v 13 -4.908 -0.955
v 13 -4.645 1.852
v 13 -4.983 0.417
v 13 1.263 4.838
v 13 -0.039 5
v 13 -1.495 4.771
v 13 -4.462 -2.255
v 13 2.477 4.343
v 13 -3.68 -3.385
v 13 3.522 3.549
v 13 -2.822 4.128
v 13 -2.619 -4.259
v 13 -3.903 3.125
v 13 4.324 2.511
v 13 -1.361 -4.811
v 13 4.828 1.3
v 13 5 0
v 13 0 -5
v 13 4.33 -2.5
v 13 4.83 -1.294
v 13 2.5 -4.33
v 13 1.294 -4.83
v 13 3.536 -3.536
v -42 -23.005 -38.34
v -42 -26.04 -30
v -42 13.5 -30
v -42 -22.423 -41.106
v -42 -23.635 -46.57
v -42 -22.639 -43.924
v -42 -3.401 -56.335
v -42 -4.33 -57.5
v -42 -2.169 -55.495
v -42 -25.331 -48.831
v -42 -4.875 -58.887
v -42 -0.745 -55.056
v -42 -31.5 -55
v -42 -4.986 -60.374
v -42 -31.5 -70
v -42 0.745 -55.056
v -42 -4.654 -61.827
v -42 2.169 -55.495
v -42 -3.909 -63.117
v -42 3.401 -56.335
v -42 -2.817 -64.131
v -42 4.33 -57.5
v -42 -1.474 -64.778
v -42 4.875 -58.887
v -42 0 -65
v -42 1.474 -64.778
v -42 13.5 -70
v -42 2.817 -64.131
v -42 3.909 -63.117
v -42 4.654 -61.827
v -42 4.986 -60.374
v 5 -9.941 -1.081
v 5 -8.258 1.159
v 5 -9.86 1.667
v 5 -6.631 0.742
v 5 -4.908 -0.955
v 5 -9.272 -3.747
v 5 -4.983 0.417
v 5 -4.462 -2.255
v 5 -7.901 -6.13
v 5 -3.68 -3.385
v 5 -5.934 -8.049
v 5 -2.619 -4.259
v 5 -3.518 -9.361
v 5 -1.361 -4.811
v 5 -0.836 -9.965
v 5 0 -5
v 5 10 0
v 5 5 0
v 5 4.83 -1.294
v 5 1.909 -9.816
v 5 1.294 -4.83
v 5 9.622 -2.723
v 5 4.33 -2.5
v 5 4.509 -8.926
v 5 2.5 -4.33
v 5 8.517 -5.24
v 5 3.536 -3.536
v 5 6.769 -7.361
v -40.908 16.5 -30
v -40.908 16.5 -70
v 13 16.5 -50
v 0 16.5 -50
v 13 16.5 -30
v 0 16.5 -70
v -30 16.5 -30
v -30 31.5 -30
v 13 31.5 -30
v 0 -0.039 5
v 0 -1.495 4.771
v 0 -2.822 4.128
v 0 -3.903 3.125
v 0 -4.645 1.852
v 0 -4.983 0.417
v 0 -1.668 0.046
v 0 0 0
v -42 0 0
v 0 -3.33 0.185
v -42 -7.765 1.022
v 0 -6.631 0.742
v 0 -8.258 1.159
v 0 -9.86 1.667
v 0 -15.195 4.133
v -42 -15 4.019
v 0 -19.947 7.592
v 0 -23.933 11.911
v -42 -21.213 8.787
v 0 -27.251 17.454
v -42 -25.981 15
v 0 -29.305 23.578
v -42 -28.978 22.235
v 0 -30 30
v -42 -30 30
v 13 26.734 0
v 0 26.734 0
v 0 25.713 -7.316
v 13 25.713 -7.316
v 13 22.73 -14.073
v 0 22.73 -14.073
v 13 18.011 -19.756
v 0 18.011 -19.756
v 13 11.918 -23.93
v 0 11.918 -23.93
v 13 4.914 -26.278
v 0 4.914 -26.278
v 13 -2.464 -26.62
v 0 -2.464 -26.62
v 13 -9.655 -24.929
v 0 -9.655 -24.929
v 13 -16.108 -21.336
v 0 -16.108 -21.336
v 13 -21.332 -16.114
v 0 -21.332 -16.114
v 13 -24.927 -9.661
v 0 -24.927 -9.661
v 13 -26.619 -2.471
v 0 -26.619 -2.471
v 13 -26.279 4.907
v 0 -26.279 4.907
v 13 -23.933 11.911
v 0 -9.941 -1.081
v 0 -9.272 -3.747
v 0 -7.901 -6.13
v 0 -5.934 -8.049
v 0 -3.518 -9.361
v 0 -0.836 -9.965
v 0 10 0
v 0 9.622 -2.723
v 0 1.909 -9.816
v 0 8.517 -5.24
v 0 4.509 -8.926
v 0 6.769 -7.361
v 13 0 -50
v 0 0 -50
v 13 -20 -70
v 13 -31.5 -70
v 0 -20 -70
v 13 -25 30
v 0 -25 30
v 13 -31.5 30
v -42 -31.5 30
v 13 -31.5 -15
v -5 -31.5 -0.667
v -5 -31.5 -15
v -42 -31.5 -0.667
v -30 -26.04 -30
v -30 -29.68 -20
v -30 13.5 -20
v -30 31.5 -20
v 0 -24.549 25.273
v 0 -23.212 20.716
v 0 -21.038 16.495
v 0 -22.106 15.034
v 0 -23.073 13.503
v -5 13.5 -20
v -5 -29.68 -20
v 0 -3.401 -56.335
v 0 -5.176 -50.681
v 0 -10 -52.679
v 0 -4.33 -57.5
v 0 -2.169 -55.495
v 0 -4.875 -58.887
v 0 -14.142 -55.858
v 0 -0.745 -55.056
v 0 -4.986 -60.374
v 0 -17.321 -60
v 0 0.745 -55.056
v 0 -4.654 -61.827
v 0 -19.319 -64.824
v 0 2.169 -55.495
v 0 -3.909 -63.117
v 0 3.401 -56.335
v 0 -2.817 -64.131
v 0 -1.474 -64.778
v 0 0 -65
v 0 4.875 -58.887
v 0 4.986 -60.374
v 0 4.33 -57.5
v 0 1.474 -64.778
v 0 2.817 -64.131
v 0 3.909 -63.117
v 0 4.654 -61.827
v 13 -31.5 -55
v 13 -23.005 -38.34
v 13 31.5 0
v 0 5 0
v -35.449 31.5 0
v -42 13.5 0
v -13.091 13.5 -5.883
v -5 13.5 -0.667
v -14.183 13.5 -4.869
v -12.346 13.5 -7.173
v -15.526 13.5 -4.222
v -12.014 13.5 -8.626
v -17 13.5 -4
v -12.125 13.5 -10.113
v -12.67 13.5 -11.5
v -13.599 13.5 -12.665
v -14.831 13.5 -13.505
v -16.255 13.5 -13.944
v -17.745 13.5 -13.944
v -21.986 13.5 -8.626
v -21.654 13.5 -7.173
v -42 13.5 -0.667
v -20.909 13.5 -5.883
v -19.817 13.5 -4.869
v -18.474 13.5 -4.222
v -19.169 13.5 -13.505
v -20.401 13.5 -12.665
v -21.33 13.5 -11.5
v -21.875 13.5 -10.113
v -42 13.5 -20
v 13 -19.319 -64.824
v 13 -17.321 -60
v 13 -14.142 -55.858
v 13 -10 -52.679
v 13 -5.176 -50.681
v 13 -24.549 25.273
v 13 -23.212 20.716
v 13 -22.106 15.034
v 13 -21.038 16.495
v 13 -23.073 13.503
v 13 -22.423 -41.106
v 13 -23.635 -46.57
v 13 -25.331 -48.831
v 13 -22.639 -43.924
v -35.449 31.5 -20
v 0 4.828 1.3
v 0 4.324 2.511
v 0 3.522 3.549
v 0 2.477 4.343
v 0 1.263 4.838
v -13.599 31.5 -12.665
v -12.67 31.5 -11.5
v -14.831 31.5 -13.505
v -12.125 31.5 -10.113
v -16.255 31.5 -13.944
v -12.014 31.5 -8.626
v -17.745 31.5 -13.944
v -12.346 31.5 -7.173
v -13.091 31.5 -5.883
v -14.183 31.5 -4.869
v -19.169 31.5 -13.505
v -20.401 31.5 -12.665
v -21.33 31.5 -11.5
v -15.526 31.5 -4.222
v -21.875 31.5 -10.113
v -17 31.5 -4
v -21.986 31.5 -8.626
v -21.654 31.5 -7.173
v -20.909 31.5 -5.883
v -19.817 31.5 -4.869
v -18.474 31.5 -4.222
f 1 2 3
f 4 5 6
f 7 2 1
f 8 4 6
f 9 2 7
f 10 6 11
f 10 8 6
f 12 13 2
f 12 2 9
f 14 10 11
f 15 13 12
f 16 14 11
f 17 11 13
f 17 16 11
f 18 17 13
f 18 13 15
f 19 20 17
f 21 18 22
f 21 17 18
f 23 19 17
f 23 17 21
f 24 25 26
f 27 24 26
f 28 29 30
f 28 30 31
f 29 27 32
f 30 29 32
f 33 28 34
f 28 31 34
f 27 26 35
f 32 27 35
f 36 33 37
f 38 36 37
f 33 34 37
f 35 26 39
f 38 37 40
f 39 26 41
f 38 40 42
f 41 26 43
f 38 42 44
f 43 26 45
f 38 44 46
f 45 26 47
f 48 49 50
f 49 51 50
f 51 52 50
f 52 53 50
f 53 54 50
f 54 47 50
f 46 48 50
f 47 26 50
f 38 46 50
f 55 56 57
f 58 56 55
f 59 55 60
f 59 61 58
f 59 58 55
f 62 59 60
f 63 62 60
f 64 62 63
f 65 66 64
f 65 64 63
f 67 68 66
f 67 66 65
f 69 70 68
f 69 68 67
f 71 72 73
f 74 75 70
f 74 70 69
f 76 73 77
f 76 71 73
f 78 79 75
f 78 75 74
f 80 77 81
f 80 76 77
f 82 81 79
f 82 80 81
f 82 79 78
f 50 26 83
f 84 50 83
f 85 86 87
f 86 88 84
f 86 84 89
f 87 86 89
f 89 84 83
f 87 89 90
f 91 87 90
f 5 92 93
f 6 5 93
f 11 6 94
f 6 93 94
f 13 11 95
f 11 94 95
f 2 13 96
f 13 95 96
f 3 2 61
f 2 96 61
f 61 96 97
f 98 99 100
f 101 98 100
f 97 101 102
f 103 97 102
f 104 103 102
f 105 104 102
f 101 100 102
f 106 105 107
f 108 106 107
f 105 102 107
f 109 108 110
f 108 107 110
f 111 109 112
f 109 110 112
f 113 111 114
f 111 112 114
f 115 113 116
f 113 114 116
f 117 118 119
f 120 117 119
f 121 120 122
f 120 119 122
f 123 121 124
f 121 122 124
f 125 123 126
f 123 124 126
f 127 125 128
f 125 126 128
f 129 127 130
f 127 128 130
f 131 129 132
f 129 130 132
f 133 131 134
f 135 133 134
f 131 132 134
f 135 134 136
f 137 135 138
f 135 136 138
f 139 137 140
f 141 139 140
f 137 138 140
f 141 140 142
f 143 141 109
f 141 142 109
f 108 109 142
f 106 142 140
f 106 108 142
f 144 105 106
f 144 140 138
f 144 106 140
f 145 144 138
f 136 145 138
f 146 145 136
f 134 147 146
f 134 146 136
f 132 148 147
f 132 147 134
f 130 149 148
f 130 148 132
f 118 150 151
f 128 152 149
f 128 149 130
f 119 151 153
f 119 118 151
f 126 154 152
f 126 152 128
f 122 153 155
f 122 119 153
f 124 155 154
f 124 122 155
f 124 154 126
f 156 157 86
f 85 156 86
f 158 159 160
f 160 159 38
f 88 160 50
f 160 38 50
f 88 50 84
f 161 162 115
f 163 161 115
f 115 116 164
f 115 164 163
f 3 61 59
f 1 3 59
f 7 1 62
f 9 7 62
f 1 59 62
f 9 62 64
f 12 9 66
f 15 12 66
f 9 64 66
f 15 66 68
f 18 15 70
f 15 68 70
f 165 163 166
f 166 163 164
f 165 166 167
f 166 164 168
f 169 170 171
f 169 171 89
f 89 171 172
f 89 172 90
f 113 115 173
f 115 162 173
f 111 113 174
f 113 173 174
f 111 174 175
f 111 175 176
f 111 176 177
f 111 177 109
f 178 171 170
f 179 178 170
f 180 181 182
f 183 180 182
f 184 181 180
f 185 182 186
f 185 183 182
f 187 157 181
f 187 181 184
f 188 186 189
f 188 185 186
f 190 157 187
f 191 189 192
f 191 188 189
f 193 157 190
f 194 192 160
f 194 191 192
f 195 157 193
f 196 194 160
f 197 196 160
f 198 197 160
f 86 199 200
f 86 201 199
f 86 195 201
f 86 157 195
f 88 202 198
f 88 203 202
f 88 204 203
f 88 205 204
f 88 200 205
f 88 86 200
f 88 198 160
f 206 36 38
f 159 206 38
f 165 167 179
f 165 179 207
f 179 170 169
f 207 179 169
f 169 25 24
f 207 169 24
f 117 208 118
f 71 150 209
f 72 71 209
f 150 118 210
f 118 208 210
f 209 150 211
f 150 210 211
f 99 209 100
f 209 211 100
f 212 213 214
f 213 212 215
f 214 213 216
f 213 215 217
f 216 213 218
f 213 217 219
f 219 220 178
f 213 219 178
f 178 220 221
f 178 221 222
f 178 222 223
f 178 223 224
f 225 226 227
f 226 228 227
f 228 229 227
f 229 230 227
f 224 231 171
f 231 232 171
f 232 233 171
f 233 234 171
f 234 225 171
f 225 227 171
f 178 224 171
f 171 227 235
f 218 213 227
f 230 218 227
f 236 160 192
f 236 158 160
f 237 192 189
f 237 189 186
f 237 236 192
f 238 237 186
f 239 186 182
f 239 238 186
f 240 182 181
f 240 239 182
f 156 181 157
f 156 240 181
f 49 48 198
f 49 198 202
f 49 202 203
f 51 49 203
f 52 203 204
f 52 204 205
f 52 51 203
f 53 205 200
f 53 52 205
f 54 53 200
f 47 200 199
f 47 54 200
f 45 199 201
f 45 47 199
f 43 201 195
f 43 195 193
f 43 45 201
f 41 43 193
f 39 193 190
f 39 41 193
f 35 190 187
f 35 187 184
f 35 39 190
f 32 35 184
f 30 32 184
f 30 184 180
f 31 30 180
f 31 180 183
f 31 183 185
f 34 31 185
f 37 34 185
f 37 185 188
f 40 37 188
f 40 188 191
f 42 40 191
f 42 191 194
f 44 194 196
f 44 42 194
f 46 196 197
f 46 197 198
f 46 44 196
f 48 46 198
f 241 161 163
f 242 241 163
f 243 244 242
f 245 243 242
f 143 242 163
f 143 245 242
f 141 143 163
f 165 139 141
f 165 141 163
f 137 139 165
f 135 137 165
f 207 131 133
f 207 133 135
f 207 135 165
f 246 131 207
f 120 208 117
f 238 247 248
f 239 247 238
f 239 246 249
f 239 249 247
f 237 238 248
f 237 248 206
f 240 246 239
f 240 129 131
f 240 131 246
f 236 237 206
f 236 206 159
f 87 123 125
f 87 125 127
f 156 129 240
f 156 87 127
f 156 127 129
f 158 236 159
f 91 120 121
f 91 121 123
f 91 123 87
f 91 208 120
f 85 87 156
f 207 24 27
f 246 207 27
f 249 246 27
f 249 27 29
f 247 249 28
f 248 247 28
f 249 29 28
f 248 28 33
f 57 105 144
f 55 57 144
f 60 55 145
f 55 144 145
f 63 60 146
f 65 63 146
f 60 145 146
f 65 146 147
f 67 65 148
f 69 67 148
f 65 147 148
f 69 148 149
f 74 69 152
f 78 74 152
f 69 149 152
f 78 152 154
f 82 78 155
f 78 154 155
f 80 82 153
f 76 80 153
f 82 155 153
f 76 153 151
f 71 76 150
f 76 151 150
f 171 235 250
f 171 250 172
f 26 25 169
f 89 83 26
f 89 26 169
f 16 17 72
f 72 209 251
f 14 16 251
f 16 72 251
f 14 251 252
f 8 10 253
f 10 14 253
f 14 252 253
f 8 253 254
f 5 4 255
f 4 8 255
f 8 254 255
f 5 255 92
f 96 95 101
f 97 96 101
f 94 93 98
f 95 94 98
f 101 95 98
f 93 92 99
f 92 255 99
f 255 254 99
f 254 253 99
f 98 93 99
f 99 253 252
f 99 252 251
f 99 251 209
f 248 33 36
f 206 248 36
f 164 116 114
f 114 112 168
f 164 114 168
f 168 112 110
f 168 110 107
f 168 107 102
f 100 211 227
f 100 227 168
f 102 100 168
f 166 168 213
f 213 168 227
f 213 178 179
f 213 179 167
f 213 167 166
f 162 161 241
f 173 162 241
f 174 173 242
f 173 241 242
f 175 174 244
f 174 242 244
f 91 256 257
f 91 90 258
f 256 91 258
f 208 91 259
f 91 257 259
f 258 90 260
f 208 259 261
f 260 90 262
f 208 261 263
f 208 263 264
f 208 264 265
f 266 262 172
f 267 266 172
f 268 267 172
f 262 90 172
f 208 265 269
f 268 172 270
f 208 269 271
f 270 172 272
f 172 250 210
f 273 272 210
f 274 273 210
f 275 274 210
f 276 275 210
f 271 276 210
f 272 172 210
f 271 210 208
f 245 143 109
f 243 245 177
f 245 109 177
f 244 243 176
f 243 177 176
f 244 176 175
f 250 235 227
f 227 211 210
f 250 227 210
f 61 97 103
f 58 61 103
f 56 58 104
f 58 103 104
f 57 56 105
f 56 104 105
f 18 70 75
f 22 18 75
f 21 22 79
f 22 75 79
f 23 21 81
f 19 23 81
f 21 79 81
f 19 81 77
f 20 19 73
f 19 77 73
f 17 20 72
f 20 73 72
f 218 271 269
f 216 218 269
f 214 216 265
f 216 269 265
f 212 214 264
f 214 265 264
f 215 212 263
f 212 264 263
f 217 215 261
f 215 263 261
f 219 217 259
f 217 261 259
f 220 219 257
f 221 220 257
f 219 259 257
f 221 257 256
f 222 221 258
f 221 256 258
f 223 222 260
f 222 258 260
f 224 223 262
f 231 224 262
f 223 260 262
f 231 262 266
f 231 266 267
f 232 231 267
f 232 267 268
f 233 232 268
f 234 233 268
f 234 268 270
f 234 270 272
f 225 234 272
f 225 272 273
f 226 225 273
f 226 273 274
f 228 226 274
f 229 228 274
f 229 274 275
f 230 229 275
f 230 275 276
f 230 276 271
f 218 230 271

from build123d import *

# Parameters (mm, degrees)
BOSS_EXTRUDE4_DEPTH = 13
BOSS_EXTRUDE5_DEPTH = 5
FILLET2_R           = 20
BOSS_EXTRUDE6_START = -42
SKETCH2_7_R         = 5
BOSS_EXTRUDE6_DEPTH = 42
SKETCH5_R           = 25
CUT_EXTRUDE1_DEPTH  = 42
SKETCH7_W           = 12
SKETCH7_H           = 10
CUT_EXTRUDE2_DEPTH  = 239
SKETCH8_R           = 5
CUT_EXTRUDE3_DEPTH  = 130
CUT_EXTRUDE4_DEPTH  = 130
CUT_EXTRUDE6_DEPTH  = 37


with BuildPart() as part:
    # Sketch2 → Boss-Extrude4 (new body)
    with BuildSketch(Plane(origin=(0, 0, 0), x_dir=(0, 0, -1), z_dir=(1, 0, 0))):
        with BuildLine():
            Line((0, 31.5), (0, 26.733616794))
            ThreePointArc((0, 26.733616794), (26.024128556, -6.118087921), (-11.911437782, -23.933322312))
            ThreePointArc((-11.911437782, -23.933322312), (-20.46059932, -28.4429224), (-30, -30))
            Line((-30, -30), (-30, -31.5))
            Line((-30, -31.5), (15, -31.5))
            Line((15, -31.5), (38.339650933, -23.005061782))
            ThreePointArc((38.339650933, -23.005061782), (43.924248506, -22.639027919), (48.830920178, -25.330920178))
            Line((48.830920178, -25.330920178), (55, -31.5))
            Line((55, -31.5), (70, -31.5))
            Line((70, -31.5), (70, -20))
            Line((70, -20), (50, -20))
            Line((50, -20), (50, 16.5))
            Line((50, 16.5), (30, 16.5))
            Line((30, 16.5), (30, 31.5))
            Line((30, 31.5), (0, 31.5))
        make_face()
        with BuildLine():
            ThreePointArc((5, 0), (3.535533906, 3.535533906), (0, 5))
            Line((0, 5), (0, 0))
            ThreePointArc((0, 0), (-0.104348142, -2.5), (-0.416666667, -4.982608643))
            ThreePointArc((-0.416666667, -4.982608643), (3.385016002, -3.679900361), (5, 0))
        make_face()
        with BuildLine():
            Line((0, 0), (0, 5))
            ThreePointArc((0, 5), (-3.549297202, 3.521716822), (-4.999847865, -0.03900425))
            ThreePointArc((-4.999847865, -0.03900425), (-3.666669267, -3.399343537), (-0.416666667, -4.982608643))
            ThreePointArc((-0.416666667, -4.982608643), (-0.104348142, -2.5), (0, 0))
        make_face()
        with BuildLine():
            ThreePointArc((-30, -30), (-20.46059932, -28.4429224), (-11.911437782, -23.933322312))
            ThreePointArc((-11.911437782, -23.933322312), (-15.61180413, -21.701563048), (-18.904262251, -18.902781162))
            ThreePointArc((-18.904262251, -18.902781162), (-24.302172741, -20.842036984), (-30, -21.5))
            Line((-30, -21.5), (-30, -30))
        make_face()
    extrude(amount=BOSS_EXTRUDE4_DEPTH)

    # Sketch2<6> → Boss-Extrude5 (add)
    with BuildSketch(Plane(origin=(0, 0, 0), x_dir=(0, 0, -1), z_dir=(1, 0, 0))):
        with BuildLine():
            ThreePointArc((-1.666666667, -9.860132972), (9.964971895, -0.836262603), (0, 10))
            Line((0, 10), (0, 5))
            ThreePointArc((0, 5), (3.535533906, 3.535533906), (5, 0))
            ThreePointArc((5, 0), (3.385016002, -3.679900361), (-0.416666667, -4.982608643))
            ThreePointArc((-0.416666667, -4.982608643), (-0.939156407, -7.447641886), (-1.666666667, -9.860132972))
        make_face()
    extrude(amount=BOSS_EXTRUDE5_DEPTH)

    # Fillet2
    fillet2_edges = [part.edges().sort_by_distance(p)[0] for p in [
        (6.5, -20, -50),
    ]]
    fillet(fillet2_edges, radius=FILLET2_R - 0.0001)  # a hair under: the kernel refuses the full size

    # Sketch2<7> → Boss-Extrude6 (add)
    with BuildSketch(Plane(origin=(0, 0, 0), x_dir=(0, 0, -1), z_dir=(1, 0, 0)).offset(BOSS_EXTRUDE6_START)):
        with BuildLine():
            Line((-30, -30), (-30, -31.5))
            Line((-30, -31.5), (15, -31.5))
            Line((15, -31.5), (38.339650933, -23.005061782))
            ThreePointArc((38.339650933, -23.005061782), (43.924248506, -22.639027919), (48.830920178, -25.330920178))
            Line((48.830920178, -25.330920178), (55, -31.5))
            Line((55, -31.5), (70, -31.5))
            Line((70, -31.5), (70, 16.5))
            Line((70, 16.5), (30, 16.5))
            Line((30, 16.5), (30, 31.5))
            Line((30, 31.5), (0, 31.5))
            Line((0, 31.5), (0, 0))
            ThreePointArc((0, 0), (-8.786796564, -21.213203436), (-30, -30))
        make_face()
        with Locations((60, 0)):
            Circle(SKETCH2_7_R, mode=Mode.SUBTRACT)
    extrude(amount=BOSS_EXTRUDE6_DEPTH)

    # Sketch5 → Cut-Extrude1 (cut)
    with BuildSketch(Plane(origin=(13, 0, 0), x_dir=(0, 0, -1), z_dir=(1, 0, 0))):
        with Locations((-30, 0)):
            Circle(SKETCH5_R)
    extrude(amount=-CUT_EXTRUDE1_DEPTH, mode=Mode.SUBTRACT)

    # Sketch7 → Cut-Extrude2 (cut)
    with BuildSketch(Plane(origin=(0, 31.5, 0), x_dir=(1, 0, 0), z_dir=(0, 1, 0))):
        with Locations((-36, 25)):
            Rectangle(SKETCH7_W, SKETCH7_H)
    extrude(amount=-CUT_EXTRUDE2_DEPTH, mode=Mode.SUBTRACT)

    # Sketch8 → Cut-Extrude3 (cut)
    with BuildSketch(Plane(origin=(0, 31.5, 0), x_dir=(1, 0, 0), z_dir=(0, 1, 0))):
        with Locations(Location((-17, 9, 0), (0, 0, 270))):
            Circle(SKETCH8_R)
    extrude(amount=-CUT_EXTRUDE3_DEPTH, mode=Mode.SUBTRACT)

    # Sketch9 → Cut-Extrude4 (cut)
    with BuildSketch(Plane.XY):
        Polygon((-42, 31.5), (-42, 13.5), (-35.448535783, 31.5), align=None)
    extrude(amount=-CUT_EXTRUDE4_DEPTH, mode=Mode.SUBTRACT)

    # Sketch10 → Cut-Extrude6 (cut)
    with BuildSketch(Plane.ZY.offset(42)):
        Polygon((-0.667060513, 13.5), (-20, 13.5), (-20, -29.680148829), (-15, -31.5), (-0.667060513, -31.5), align=None)
    extrude(amount=-CUT_EXTRUDE6_DEPTH, mode=Mode.SUBTRACT)


solid = part.part
